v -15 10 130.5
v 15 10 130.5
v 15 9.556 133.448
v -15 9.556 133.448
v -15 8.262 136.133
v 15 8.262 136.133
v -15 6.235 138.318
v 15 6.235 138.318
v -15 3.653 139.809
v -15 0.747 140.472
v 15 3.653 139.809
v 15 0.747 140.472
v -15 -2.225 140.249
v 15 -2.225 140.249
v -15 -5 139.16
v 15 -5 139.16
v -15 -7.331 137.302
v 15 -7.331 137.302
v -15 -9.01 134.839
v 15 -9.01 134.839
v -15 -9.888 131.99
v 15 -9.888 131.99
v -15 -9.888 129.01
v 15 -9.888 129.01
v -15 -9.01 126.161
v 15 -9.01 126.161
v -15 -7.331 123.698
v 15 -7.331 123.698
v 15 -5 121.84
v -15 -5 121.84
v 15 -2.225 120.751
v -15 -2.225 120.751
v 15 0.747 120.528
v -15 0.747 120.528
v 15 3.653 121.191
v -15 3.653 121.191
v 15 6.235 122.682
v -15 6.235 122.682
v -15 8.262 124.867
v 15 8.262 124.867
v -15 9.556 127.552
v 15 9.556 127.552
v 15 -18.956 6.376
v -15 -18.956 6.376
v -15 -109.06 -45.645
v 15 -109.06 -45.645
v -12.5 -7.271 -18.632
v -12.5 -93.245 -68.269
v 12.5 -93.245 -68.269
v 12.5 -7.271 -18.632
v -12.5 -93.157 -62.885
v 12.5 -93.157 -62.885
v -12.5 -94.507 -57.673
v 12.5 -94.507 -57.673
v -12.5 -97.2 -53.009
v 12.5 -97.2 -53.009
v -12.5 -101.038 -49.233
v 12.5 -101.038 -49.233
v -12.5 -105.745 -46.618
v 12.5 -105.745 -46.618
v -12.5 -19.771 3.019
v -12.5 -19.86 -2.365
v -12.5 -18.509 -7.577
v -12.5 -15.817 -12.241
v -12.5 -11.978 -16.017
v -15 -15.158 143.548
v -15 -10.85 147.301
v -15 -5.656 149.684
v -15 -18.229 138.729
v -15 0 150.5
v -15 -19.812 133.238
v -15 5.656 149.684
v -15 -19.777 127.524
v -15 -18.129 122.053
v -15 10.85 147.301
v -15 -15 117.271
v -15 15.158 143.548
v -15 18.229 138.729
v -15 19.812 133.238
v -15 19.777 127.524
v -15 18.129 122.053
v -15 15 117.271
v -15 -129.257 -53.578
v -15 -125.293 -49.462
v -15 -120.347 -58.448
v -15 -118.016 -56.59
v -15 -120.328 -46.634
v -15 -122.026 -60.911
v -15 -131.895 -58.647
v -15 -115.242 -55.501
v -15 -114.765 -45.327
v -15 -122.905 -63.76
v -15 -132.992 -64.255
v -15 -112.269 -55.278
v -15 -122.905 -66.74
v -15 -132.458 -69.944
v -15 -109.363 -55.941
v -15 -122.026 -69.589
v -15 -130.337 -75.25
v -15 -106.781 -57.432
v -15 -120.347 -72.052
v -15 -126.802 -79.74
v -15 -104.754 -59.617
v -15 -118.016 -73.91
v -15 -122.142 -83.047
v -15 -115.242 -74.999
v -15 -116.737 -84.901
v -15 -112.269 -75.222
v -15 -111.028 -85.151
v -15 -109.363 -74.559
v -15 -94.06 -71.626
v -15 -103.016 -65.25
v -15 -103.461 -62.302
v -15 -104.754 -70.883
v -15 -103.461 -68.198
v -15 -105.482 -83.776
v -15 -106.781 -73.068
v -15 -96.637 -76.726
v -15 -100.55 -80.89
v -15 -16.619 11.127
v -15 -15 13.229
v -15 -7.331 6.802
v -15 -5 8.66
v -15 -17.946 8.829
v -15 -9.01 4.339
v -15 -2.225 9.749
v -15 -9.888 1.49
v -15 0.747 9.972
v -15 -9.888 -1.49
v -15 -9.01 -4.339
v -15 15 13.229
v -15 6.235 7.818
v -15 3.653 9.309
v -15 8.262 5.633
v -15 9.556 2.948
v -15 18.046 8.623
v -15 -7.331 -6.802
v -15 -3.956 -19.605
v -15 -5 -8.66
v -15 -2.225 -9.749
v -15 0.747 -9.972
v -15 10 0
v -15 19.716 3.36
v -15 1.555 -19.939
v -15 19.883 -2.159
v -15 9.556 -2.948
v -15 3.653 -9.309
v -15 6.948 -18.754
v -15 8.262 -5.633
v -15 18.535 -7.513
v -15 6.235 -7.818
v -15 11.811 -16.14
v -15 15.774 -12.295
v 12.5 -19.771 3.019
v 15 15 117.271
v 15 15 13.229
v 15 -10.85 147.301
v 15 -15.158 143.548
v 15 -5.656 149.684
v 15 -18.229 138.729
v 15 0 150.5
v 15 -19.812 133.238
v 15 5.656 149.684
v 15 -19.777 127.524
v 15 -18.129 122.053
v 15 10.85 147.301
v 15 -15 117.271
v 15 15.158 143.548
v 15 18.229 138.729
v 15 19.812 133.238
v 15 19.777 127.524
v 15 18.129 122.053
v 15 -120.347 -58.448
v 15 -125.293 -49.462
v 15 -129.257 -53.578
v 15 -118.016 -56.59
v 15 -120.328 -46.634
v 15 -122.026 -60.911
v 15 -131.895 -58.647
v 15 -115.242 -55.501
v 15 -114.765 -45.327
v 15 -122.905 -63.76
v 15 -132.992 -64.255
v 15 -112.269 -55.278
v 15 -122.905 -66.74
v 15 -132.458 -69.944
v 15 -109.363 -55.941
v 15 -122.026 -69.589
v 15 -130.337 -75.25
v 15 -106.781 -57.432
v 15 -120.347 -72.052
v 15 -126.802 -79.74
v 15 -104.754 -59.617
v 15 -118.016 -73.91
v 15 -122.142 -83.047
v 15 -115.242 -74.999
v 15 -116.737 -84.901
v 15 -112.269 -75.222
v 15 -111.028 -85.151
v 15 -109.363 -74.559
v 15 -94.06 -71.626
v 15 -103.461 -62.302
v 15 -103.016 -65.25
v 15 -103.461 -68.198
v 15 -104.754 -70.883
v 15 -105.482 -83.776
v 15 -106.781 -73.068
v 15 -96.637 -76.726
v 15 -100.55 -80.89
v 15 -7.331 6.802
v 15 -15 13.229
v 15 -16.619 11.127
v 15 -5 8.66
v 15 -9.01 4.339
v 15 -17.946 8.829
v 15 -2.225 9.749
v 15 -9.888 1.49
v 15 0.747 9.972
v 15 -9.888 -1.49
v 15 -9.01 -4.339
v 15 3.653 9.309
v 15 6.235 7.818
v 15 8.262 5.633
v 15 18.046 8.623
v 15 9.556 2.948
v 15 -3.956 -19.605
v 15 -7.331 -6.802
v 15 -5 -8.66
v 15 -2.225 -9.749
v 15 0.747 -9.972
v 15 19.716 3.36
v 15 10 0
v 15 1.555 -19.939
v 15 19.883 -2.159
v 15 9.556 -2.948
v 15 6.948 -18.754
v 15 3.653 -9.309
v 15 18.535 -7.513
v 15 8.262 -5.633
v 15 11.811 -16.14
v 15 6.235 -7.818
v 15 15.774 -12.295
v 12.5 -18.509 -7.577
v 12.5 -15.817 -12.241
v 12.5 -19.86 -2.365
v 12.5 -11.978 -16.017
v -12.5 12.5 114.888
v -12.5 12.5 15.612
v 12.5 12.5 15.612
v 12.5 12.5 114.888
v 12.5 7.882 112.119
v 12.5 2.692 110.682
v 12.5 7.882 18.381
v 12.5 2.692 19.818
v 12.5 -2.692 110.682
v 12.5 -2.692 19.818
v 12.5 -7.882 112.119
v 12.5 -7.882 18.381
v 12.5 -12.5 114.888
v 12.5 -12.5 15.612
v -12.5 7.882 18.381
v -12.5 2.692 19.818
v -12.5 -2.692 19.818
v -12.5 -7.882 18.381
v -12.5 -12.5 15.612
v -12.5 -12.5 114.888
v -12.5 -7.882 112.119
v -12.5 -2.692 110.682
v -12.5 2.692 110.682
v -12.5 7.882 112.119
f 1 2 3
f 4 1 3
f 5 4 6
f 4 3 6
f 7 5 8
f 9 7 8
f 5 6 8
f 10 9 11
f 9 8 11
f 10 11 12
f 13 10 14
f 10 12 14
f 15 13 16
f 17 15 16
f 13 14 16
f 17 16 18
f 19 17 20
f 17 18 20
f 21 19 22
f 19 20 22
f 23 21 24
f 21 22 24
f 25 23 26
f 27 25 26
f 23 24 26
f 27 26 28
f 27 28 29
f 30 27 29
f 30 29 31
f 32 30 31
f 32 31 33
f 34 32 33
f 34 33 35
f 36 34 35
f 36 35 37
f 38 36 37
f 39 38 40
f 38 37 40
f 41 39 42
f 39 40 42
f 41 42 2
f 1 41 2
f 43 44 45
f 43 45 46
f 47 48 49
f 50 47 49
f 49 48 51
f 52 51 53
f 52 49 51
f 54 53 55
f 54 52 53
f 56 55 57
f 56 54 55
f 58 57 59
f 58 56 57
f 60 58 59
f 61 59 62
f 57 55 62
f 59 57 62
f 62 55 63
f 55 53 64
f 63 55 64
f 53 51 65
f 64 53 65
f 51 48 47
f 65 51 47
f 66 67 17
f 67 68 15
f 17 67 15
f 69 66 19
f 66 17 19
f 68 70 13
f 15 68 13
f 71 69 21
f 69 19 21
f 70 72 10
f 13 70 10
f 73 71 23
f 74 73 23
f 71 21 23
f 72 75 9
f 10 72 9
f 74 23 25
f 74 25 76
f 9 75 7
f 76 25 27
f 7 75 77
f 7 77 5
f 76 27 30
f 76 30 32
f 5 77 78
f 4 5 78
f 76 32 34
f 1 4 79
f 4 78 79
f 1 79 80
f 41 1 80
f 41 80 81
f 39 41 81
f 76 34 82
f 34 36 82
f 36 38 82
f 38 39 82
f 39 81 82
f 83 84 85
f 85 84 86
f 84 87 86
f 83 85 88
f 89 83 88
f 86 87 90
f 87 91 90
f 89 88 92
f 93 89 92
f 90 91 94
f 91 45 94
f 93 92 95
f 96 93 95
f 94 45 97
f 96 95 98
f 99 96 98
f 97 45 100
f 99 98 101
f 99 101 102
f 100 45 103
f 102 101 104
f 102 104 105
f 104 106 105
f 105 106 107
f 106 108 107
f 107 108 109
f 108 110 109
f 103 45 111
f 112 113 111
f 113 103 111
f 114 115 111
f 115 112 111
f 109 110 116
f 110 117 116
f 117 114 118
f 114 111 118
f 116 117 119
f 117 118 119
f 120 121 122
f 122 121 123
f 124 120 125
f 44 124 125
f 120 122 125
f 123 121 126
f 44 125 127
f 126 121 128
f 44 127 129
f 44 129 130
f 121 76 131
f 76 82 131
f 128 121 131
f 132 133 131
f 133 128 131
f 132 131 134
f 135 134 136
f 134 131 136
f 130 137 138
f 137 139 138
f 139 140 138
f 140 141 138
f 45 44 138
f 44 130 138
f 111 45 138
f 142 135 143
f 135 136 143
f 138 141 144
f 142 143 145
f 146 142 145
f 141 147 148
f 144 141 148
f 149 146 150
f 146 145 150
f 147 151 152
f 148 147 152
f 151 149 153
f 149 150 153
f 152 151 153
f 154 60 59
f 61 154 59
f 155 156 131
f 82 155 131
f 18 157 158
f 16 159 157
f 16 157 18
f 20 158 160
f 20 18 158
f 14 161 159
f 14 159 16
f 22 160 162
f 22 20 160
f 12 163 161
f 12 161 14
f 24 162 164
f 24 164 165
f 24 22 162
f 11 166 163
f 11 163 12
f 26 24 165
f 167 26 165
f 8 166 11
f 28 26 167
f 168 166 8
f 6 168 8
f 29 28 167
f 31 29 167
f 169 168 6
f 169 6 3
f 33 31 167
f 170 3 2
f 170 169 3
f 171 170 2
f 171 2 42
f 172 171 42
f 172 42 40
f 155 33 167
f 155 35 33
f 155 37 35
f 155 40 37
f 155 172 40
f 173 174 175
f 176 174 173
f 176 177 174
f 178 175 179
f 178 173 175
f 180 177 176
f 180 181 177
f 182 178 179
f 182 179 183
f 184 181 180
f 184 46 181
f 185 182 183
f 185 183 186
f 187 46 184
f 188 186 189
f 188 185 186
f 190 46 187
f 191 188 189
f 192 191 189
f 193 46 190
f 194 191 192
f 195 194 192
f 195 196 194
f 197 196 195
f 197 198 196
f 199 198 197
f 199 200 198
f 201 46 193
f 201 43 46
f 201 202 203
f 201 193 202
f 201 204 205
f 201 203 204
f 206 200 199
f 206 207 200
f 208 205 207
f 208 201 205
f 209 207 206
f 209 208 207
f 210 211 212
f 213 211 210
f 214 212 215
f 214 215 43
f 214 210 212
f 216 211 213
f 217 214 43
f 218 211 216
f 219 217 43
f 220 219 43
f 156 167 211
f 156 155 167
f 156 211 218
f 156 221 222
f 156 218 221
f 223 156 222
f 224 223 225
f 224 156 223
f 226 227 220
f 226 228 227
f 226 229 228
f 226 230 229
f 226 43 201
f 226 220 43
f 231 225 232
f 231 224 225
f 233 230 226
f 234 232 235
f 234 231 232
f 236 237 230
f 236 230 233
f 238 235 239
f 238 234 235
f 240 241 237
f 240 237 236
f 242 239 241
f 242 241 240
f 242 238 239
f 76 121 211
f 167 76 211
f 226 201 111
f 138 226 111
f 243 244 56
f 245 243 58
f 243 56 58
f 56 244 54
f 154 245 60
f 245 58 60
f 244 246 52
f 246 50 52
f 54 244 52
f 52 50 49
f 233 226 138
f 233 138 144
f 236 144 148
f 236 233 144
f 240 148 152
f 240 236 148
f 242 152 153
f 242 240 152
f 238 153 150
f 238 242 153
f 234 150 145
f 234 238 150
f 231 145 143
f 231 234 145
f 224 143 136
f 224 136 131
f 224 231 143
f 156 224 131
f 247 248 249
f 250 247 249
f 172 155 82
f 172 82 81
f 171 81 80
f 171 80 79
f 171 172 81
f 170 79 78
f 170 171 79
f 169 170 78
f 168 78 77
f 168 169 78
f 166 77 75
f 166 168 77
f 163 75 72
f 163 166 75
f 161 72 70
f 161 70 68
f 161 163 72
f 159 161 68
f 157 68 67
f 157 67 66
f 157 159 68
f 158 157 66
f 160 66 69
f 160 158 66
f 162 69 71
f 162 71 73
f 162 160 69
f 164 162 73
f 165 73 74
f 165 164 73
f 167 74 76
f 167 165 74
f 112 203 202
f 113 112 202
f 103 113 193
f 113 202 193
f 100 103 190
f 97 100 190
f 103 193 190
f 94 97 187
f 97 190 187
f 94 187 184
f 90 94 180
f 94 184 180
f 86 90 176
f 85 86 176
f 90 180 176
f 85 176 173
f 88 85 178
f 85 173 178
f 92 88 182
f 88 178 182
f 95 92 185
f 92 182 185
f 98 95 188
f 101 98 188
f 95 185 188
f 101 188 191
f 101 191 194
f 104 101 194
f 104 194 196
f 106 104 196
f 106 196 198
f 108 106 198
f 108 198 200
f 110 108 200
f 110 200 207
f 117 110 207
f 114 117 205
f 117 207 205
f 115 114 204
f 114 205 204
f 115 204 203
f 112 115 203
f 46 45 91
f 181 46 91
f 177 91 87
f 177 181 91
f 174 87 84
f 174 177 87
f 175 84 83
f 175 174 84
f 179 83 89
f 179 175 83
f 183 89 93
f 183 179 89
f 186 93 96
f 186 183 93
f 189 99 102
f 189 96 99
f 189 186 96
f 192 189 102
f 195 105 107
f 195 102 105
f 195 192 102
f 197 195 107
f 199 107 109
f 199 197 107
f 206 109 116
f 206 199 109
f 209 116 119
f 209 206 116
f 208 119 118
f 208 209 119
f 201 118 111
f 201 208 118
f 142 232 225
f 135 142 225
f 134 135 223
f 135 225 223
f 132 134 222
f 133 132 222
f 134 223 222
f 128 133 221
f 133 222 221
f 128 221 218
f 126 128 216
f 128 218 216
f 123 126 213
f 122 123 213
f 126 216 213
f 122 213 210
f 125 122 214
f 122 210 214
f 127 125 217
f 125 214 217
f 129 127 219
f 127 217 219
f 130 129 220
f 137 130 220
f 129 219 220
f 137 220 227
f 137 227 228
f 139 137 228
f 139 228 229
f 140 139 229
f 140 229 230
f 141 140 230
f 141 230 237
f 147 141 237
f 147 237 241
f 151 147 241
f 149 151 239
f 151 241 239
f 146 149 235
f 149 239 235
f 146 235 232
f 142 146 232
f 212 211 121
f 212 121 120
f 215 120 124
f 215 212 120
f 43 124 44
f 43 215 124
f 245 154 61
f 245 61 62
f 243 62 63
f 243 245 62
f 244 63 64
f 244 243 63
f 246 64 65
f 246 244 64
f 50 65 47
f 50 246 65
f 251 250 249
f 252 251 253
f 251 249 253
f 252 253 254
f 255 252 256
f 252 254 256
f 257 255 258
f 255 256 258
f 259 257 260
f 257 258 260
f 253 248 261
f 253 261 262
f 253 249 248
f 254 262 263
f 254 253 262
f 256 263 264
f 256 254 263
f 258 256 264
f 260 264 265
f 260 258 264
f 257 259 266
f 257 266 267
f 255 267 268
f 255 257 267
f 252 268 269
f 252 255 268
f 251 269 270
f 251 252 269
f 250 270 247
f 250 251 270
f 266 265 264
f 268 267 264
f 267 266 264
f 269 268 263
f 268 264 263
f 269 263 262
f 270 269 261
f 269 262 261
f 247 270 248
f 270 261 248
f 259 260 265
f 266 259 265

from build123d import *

# Parameters (mm, degrees)
SKETCH2_W           = 30
SKETCH2_H           = 30
SKETCH2_W_2         = 25
SKETCH2_H_2         = 25
SKETCH3_R           = 20
BOSS_EXTRUDE2_DEPTH = 30
SKETCH4_R           = 10
CUT_EXTRUDE1_DEPTH  = 30


with BuildPart() as part:
    # Sweep1: sweep along a path in Sketch1
    with BuildLine(Plane(origin=(0, 0, 0), x_dir=(0, 0, -1), z_dir=(1, 0, 0))) as sweep1_path:
        Line((-130.5, 0), (0, 0))
        Line((0, 0), (65.25, -113.016315194))
    # Sketch2 → Sweep1 (sweep)
    with BuildSketch(Plane.XY.offset(130.5)):
        Rectangle(SKETCH2_W, SKETCH2_H)
        Rectangle(SKETCH2_W_2, SKETCH2_H_2, mode=Mode.SUBTRACT)
    sweep(path=sweep1_path.line, transition=Transition.RIGHT)

    # Sketch3 → Boss-Extrude2 (add)
    with BuildSketch(Plane(origin=(15, 0, 0), x_dir=(0, 0, -1), z_dir=(1, 0, 0))):
        Circle(SKETCH3_R)
        with Locations((65.25, -113.016315194)):
            Circle(SKETCH3_R)
        with Locations((-130.5, 0)):
            Circle(SKETCH3_R)
    extrude(amount=-BOSS_EXTRUDE2_DEPTH)

    # Sketch4 → Cut-Extrude1 (cut)
    with BuildSketch(Plane(origin=(15, 0, 0), x_dir=(0, 0, -1), z_dir=(1, 0, 0))):
        with Locations(Location((-130.5, 0, 0), (0, 0, 90))):
            Circle(SKETCH4_R)
        with Locations(Location((0, 0, 0), (0, 0, 90))):
            Circle(SKETCH4_R)
        with Locations(Location((65.25, -113.016315194, 0), (0, 0, 90))):
            Circle(SKETCH4_R)
    extrude(amount=-CUT_EXTRUDE1_DEPTH, mode=Mode.SUBTRACT)


solid = part.part
